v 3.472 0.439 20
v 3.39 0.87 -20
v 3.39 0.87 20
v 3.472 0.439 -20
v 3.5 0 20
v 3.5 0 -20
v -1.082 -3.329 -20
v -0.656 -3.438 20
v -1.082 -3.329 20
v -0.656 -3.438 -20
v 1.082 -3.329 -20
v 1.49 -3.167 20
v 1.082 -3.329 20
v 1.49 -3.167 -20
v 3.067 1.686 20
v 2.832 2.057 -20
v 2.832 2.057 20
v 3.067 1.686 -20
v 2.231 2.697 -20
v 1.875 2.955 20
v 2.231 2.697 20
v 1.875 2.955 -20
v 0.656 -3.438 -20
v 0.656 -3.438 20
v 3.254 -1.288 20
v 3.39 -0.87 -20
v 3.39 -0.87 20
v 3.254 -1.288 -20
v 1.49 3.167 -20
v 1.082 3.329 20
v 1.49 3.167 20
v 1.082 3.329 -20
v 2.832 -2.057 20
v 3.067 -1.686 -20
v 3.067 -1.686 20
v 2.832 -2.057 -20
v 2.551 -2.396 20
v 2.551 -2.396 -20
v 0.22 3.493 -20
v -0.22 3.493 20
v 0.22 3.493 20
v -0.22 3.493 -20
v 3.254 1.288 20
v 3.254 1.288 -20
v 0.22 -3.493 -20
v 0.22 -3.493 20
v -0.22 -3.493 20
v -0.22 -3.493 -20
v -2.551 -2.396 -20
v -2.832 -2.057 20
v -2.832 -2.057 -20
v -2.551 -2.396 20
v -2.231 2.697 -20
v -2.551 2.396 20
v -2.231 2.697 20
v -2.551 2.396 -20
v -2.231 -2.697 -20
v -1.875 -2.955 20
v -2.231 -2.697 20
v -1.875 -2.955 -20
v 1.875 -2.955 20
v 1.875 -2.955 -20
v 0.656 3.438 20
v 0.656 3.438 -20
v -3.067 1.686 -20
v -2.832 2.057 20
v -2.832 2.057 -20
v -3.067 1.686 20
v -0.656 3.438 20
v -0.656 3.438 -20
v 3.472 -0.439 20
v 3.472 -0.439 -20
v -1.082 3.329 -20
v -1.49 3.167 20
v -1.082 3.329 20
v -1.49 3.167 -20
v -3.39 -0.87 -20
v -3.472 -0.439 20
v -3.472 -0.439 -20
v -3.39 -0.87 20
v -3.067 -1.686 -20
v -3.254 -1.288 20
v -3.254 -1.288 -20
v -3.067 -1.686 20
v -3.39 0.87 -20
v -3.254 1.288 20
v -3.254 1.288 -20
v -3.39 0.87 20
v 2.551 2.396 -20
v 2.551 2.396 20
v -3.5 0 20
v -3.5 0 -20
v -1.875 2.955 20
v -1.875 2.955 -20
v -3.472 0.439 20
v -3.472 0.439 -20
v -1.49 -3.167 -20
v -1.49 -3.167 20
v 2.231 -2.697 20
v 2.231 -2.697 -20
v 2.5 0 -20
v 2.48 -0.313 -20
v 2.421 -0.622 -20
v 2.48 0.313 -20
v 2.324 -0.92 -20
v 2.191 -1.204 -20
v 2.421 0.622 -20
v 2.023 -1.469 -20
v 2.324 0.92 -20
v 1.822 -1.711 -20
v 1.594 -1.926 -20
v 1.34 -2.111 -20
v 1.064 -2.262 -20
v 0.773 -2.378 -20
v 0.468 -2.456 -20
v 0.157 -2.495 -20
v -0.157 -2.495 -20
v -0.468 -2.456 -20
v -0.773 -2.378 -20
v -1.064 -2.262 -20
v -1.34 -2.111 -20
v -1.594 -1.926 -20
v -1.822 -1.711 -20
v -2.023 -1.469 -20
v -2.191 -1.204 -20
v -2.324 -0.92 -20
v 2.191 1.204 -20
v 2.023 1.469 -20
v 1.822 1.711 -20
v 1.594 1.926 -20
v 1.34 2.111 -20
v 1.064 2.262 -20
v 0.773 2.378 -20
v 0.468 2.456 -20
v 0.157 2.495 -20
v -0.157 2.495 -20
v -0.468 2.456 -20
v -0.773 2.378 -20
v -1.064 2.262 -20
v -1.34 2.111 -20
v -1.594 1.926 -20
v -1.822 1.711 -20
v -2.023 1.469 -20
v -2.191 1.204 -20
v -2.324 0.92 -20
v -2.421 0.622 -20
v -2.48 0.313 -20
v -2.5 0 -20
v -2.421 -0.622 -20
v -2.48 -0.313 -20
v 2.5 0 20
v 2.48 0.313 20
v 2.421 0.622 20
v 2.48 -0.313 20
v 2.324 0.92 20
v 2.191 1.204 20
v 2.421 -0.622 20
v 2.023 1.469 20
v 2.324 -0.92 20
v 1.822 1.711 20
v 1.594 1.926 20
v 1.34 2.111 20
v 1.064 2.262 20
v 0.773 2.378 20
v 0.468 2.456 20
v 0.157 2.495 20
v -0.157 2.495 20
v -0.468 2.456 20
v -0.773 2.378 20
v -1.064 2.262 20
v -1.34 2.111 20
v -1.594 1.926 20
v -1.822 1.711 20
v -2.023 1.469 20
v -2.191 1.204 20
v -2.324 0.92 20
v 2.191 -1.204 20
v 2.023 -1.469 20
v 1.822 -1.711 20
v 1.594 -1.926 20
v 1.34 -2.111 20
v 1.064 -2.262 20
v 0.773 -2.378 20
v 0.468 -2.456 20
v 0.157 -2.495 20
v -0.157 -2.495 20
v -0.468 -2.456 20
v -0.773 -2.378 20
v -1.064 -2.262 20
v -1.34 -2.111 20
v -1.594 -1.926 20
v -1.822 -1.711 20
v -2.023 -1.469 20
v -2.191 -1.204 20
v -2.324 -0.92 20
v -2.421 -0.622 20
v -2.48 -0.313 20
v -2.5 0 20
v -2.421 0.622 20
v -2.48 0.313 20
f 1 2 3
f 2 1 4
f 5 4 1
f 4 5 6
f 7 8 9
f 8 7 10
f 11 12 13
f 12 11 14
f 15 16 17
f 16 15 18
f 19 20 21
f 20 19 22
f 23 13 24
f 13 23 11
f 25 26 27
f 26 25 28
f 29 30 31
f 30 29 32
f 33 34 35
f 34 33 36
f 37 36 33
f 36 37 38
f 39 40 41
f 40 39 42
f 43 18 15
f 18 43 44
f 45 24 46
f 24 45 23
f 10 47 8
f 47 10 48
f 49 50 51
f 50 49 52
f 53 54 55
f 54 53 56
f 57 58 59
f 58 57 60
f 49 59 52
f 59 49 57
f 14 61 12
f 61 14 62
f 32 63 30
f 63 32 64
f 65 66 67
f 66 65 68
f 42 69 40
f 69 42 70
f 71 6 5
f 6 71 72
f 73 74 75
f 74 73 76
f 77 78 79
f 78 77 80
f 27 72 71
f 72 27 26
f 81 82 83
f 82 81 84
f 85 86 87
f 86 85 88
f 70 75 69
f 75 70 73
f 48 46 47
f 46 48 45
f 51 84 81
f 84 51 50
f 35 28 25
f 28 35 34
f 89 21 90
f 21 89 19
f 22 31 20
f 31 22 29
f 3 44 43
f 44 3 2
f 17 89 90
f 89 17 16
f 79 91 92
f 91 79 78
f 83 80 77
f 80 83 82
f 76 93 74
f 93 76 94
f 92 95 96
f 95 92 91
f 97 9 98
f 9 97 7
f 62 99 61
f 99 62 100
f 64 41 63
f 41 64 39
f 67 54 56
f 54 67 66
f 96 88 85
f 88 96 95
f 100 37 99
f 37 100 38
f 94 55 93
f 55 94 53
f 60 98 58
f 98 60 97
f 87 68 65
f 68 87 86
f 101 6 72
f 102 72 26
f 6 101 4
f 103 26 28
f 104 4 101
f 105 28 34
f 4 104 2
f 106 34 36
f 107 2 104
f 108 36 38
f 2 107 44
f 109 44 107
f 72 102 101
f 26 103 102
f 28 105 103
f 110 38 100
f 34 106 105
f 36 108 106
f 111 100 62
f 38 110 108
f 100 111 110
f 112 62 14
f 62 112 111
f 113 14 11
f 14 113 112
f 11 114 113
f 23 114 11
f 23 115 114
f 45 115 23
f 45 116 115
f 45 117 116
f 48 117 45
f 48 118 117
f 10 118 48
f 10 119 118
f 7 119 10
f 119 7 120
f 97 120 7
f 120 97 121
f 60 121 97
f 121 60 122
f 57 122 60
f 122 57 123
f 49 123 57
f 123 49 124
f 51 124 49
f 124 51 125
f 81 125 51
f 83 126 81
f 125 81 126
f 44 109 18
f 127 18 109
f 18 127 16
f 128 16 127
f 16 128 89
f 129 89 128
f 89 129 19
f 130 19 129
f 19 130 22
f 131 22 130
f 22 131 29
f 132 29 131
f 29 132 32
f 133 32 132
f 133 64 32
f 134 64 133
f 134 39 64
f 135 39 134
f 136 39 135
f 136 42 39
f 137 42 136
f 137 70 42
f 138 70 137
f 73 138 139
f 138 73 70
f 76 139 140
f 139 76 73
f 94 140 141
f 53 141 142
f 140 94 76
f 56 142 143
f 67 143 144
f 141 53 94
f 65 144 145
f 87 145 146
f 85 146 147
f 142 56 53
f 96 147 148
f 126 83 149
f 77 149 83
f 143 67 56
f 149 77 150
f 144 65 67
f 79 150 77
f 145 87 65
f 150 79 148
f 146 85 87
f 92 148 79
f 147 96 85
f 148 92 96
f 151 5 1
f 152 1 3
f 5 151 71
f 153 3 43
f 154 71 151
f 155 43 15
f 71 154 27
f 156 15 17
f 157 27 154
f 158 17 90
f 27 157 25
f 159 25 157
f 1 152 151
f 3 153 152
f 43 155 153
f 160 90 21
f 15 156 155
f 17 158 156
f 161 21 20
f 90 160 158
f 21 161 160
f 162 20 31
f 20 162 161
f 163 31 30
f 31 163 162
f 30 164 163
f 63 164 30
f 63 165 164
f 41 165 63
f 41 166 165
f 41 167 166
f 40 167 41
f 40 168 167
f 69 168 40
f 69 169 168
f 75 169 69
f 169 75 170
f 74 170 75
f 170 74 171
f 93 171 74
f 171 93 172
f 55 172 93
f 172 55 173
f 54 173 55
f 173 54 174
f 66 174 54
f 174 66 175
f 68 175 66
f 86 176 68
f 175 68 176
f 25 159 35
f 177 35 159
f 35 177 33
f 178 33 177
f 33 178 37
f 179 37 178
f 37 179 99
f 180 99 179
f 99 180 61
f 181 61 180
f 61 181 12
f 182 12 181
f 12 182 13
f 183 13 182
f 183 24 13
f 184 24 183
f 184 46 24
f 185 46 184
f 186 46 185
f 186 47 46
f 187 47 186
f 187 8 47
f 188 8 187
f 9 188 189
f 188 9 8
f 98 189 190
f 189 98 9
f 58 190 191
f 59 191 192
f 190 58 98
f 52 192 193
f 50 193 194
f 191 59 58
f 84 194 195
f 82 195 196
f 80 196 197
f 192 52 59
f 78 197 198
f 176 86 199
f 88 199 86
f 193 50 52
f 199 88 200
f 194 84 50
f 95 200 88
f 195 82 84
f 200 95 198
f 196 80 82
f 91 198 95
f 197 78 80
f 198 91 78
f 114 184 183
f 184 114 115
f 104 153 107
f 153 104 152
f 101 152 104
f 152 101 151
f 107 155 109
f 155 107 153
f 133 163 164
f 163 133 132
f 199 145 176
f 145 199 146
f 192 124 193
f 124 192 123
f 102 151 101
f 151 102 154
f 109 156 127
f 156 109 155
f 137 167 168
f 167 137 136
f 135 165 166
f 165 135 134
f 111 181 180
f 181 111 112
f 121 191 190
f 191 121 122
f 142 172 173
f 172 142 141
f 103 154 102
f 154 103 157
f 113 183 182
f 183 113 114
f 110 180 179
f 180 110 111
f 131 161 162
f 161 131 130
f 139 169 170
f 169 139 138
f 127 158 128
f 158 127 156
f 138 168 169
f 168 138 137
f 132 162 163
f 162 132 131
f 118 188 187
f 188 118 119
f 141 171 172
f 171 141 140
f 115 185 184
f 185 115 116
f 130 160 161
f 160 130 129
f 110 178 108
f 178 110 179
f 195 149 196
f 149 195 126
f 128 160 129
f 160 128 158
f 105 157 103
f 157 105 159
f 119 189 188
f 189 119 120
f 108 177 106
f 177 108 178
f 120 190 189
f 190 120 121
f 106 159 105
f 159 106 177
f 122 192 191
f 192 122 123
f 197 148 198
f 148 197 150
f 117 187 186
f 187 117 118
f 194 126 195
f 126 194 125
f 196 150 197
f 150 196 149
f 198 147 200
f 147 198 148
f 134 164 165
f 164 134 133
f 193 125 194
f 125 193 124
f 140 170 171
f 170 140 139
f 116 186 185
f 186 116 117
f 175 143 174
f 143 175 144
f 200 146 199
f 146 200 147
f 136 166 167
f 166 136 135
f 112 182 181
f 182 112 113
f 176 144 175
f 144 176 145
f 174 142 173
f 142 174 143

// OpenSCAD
$fn = 50;


difference() {
	union() {
		translate(v = [0, 0, -20.0000000000]) {
			cylinder(h = 40, r = 3.5000000000);
		}
	}
	union() {
		translate(v = [0, 0, -100.0000000000]) {
			cylinder(h = 200, r = 2.5000000000);
		}
	}
}
